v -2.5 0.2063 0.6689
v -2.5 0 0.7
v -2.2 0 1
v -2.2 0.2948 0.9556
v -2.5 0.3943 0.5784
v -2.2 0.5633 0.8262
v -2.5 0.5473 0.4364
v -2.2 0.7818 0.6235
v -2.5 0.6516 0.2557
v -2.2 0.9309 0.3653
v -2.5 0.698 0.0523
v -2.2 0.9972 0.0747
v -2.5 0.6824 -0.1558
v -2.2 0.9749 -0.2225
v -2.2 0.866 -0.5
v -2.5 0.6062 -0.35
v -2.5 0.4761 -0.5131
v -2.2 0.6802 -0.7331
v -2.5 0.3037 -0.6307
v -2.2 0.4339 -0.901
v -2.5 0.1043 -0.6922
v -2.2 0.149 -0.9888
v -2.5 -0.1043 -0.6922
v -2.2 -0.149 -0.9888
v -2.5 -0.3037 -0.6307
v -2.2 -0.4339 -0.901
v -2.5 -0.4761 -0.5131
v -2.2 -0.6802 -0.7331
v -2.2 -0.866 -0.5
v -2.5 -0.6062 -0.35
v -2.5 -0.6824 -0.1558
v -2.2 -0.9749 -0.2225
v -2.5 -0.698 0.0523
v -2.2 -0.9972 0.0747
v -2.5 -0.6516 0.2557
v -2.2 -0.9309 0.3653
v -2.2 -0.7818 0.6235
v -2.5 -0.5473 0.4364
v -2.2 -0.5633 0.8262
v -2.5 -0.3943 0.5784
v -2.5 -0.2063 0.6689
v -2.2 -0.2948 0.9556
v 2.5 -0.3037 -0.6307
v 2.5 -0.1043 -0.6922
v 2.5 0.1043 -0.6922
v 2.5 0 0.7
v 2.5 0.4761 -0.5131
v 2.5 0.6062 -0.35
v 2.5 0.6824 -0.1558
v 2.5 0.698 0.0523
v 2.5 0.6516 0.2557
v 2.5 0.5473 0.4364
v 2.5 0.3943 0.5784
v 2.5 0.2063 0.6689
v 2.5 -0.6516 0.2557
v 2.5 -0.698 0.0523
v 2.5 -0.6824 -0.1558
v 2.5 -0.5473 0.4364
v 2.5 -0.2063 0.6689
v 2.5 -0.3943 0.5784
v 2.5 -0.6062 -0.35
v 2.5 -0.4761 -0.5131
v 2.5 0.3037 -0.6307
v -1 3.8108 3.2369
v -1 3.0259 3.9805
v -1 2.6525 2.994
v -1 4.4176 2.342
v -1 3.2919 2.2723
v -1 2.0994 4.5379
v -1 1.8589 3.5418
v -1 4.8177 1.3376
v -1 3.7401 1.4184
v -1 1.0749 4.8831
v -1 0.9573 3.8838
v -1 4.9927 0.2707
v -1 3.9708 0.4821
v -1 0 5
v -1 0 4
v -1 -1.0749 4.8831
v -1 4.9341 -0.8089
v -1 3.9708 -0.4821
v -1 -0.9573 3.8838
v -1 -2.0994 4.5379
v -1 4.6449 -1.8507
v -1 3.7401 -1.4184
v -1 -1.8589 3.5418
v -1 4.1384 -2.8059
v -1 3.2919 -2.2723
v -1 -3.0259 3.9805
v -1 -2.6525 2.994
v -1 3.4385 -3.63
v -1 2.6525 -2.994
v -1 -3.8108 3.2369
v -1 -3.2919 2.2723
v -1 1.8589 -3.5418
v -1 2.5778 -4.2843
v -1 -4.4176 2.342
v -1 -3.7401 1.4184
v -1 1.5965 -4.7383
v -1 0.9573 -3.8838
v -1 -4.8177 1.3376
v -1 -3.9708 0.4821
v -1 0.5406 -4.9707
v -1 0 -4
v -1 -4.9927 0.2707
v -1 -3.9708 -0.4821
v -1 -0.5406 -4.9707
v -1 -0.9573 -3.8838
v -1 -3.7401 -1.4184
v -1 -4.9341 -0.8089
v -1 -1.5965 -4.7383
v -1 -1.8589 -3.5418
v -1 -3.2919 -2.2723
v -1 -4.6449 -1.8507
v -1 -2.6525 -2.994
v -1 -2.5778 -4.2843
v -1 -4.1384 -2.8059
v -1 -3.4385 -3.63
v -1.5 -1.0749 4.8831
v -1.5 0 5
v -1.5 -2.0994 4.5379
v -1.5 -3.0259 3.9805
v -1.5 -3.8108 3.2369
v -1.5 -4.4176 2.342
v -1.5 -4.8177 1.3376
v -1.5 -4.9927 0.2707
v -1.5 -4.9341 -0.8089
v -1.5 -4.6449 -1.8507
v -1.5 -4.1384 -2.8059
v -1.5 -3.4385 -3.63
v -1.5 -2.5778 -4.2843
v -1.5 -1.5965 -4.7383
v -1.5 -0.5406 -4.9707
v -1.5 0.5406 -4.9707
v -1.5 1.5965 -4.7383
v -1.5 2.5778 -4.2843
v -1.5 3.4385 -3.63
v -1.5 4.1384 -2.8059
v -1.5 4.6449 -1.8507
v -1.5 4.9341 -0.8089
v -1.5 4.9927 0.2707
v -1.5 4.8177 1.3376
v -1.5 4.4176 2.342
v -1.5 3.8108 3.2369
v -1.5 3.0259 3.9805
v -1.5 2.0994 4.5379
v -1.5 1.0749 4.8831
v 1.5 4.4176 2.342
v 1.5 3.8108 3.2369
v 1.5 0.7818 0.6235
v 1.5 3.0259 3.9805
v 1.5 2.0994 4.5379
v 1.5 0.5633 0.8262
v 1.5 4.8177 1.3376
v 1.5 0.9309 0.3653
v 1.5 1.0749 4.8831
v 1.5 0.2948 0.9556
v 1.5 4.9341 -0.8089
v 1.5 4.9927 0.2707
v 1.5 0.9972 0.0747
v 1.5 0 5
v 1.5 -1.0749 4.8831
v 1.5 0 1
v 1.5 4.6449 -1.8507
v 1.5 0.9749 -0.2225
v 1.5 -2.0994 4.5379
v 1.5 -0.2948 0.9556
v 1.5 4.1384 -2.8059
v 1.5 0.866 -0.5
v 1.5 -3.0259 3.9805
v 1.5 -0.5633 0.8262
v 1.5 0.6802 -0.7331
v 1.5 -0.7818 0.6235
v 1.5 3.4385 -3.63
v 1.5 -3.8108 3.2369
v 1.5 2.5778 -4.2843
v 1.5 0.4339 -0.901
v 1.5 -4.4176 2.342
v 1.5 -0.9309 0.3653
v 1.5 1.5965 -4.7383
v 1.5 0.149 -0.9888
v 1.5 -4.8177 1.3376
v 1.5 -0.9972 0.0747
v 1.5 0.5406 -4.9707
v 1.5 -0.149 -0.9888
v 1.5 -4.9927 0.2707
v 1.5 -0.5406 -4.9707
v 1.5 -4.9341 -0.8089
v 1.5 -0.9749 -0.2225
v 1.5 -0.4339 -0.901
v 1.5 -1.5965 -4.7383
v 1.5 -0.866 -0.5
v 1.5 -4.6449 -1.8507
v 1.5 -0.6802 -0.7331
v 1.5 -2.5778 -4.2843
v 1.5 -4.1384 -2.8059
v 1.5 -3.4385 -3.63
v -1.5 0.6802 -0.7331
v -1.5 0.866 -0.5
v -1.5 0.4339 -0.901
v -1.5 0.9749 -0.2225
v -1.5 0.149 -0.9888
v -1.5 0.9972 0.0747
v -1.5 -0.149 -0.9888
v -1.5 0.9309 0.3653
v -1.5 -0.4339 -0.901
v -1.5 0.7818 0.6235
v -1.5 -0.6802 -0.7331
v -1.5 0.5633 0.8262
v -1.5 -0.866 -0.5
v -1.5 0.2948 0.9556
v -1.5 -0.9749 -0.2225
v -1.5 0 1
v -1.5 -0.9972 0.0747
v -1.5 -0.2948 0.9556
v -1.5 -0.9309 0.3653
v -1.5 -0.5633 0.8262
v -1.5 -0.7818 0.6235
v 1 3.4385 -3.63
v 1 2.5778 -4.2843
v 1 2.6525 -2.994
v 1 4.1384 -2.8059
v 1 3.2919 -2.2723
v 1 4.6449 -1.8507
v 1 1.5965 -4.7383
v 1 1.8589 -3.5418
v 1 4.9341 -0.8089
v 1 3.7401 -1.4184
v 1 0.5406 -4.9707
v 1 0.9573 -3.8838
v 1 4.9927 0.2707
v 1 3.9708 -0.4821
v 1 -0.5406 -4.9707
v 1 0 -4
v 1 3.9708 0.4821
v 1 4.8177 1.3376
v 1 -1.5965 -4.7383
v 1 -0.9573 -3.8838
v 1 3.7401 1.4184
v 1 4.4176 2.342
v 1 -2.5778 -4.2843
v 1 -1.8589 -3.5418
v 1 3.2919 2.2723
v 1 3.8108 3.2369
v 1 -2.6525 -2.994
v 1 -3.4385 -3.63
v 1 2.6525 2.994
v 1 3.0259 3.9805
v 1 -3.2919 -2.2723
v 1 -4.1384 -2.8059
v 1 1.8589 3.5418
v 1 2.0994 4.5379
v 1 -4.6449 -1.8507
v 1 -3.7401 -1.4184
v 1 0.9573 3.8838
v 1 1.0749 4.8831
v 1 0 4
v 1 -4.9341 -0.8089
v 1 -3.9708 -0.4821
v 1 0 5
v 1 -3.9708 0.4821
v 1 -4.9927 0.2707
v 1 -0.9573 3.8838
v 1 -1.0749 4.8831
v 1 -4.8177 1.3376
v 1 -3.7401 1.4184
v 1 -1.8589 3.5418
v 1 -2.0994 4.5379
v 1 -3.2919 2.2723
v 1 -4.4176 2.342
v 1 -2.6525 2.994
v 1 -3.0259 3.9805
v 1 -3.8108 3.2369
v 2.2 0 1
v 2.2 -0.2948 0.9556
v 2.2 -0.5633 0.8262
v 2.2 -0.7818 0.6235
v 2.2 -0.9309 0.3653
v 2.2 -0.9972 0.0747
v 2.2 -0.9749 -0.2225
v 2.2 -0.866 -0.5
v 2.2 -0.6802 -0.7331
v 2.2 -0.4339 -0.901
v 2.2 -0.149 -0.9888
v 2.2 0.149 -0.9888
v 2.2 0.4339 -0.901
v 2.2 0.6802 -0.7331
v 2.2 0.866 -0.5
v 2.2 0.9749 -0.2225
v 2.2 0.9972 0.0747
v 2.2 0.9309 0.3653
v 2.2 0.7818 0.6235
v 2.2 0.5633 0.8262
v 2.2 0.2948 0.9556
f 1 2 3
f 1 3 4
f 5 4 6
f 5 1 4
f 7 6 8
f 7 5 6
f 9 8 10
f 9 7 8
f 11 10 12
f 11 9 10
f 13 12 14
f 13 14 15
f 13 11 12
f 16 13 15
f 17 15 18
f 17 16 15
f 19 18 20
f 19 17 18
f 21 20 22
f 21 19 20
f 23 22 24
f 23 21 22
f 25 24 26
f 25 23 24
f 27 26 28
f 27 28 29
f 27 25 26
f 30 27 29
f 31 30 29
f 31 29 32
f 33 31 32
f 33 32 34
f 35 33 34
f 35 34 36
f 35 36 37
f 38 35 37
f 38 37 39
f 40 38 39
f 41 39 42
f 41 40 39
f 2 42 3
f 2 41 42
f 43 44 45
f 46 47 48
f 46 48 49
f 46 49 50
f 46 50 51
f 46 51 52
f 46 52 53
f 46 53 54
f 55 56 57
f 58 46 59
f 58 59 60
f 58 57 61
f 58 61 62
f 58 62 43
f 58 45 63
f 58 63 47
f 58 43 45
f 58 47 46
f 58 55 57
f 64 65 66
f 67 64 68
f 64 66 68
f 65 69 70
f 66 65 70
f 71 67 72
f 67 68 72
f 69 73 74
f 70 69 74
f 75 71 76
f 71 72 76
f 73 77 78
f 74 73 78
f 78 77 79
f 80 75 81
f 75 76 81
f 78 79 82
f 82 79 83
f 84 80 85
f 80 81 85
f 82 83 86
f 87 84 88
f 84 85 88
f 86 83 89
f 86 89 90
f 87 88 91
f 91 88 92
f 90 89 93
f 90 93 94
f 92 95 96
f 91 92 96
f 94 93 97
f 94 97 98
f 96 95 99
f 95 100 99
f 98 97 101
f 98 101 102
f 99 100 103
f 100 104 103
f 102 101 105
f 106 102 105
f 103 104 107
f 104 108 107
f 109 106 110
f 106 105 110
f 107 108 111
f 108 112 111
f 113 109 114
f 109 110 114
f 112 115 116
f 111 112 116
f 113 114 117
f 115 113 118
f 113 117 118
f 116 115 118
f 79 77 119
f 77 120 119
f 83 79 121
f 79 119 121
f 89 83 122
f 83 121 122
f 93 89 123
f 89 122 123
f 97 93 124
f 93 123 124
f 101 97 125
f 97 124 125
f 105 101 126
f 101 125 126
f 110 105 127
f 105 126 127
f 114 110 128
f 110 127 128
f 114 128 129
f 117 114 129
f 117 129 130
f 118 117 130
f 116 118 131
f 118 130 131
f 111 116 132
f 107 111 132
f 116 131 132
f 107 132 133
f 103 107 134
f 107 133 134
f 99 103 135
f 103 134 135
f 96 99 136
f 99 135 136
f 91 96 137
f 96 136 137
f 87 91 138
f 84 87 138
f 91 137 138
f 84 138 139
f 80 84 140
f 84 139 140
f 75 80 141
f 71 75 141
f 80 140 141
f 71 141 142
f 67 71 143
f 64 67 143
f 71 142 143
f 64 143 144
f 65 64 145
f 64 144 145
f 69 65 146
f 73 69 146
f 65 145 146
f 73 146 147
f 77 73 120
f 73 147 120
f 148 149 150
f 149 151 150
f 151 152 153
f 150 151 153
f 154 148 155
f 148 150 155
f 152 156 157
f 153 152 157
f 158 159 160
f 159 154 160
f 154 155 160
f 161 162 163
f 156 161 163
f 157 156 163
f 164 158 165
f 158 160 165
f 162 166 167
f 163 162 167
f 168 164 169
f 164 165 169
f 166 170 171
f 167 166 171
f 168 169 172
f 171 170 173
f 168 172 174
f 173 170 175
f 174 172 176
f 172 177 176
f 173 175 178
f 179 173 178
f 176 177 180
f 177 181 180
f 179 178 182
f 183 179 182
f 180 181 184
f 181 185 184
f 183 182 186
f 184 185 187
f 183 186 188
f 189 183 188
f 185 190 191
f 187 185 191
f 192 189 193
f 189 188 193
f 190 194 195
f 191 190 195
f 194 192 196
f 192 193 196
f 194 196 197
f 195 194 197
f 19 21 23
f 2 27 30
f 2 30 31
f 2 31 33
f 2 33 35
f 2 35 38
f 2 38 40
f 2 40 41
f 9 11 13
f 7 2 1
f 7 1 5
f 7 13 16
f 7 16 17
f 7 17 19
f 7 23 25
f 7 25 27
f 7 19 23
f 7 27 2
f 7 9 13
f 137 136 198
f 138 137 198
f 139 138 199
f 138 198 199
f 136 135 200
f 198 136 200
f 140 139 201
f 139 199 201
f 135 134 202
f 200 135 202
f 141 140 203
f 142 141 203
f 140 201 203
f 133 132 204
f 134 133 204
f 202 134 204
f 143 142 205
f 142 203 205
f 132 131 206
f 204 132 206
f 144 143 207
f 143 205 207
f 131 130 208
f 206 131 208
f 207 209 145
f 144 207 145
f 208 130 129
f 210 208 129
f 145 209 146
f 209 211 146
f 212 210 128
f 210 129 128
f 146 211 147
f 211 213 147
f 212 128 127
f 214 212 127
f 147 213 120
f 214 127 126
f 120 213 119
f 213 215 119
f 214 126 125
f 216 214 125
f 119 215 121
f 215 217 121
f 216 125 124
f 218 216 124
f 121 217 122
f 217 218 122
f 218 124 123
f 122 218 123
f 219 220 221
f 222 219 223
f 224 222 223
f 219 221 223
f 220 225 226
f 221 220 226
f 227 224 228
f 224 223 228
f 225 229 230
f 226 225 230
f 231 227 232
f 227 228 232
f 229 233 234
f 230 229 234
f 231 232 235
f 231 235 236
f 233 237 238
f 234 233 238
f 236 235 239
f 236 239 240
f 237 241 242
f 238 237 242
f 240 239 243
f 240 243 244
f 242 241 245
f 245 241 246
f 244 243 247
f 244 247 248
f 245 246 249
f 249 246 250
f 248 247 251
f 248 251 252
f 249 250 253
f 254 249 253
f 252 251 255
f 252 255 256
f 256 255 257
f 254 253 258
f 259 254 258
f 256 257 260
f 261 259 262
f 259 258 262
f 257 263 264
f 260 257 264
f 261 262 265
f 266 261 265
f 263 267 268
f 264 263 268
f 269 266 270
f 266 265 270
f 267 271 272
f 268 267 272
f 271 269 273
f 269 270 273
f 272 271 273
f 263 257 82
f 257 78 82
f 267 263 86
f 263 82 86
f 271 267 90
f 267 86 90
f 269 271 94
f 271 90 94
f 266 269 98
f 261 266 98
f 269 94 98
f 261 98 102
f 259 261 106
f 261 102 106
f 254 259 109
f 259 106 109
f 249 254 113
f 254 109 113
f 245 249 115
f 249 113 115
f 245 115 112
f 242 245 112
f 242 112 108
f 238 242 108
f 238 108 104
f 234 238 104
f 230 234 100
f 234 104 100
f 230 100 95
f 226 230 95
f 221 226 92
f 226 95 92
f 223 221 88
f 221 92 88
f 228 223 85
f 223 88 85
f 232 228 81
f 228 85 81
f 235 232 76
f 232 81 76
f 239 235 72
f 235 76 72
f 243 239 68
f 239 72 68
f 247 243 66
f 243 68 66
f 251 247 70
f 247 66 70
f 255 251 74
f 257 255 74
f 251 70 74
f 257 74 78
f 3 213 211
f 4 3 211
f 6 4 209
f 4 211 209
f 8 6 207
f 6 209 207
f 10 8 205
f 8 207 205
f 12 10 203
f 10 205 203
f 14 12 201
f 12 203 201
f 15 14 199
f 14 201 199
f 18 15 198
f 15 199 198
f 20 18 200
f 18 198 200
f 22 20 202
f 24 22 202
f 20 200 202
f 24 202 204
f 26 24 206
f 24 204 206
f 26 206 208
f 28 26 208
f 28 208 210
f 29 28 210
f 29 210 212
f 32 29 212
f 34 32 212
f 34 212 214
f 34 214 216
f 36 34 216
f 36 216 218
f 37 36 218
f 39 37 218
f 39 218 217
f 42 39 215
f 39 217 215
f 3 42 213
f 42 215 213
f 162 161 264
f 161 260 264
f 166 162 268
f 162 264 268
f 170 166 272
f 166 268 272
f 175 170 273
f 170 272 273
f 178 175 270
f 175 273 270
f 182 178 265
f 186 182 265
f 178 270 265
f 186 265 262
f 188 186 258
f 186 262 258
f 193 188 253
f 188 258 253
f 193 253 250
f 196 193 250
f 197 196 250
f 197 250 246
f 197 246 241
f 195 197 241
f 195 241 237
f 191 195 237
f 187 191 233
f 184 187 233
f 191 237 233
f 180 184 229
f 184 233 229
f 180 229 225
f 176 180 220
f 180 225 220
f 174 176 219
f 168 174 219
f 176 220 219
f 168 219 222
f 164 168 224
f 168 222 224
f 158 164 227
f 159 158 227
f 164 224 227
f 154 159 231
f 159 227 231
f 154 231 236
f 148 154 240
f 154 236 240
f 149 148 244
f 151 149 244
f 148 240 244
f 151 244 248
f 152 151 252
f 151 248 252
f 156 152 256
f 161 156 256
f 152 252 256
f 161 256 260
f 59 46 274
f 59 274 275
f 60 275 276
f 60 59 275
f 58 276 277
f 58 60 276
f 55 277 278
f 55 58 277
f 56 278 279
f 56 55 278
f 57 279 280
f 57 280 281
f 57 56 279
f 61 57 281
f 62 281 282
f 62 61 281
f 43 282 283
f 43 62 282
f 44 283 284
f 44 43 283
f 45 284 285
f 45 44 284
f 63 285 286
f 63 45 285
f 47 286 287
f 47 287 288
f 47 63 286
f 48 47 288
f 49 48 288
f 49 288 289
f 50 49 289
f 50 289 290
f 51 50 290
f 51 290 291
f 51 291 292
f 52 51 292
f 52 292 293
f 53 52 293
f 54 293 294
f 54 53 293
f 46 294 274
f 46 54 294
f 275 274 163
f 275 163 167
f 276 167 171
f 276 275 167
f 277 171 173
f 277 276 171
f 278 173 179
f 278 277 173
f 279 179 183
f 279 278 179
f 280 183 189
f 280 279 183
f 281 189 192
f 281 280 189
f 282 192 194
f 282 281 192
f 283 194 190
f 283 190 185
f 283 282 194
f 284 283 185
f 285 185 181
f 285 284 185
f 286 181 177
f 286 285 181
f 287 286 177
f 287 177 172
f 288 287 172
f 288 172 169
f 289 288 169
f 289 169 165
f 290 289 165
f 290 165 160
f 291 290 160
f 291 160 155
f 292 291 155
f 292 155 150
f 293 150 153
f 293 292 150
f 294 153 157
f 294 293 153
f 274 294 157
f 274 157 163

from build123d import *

# Parameters (mm, degrees)
ESBO_O2_R                = 1
RESSALTO_EXTRUS_O1_DEPTH = 1
RESSALTO_EXTRUS_O2_START = 1
ESBO_O4_R                = 1
RESSALTO_EXTRUS_O2_DEPTH = 1
CHANFRO1_SIZE            = 0.3
CHANFRO2_SIZE            = 0.3


with BuildPart() as part:
    # Esboço1 → Revolução2 (revolve)
    with BuildSketch(Plane.XY, mode=Mode.PRIVATE) as revolu_o2_sk:
        Polygon((-1, 5), (-1.5, 5), (-1.5, 0), (1.5, 0), (1.5, 5), (1, 5), (1, 4), (0, 4), (-1, 4), align=None)
    revolve(revolu_o2_sk.sketch.rotate(Axis((0, 0, 0), (1, 0, 0)), 90), axis=Axis((0, 0, 0), (1, 0, 0)))

    # Esboço2 → Ressalto-extrusão1 (add)
    with BuildSketch(Plane.ZY.offset(1.5)):
        Circle(ESBO_O2_R)
    extrude(amount=RESSALTO_EXTRUS_O1_DEPTH)

    # Esboço4 → Ressalto-extrusão2 (add)
    with BuildSketch(Plane(origin=(1.5, 0, 0), x_dir=(0, 0, -1), z_dir=(1, 0, 0)).offset(RESSALTO_EXTRUS_O2_START)):
        with Locations(Location((0, 0, 0), (0, 0, 180))):
            Circle(ESBO_O4_R)
    extrude(amount=-RESSALTO_EXTRUS_O2_DEPTH)

    # Chanfro1
    chanfro1_edges = [part.edges().sort_by_distance(p)[0] for p in [
        (-2.5, 0, -1),
    ]]
    chamfer(chanfro1_edges, length=CHANFRO1_SIZE)

    # Chanfro2
    chanfro2_edges = [part.edges().sort_by_distance(p)[0] for p in [
        (2.5, 0, -1),
    ]]
    chamfer(chanfro2_edges, length=CHANFRO2_SIZE)


solid = part.part
